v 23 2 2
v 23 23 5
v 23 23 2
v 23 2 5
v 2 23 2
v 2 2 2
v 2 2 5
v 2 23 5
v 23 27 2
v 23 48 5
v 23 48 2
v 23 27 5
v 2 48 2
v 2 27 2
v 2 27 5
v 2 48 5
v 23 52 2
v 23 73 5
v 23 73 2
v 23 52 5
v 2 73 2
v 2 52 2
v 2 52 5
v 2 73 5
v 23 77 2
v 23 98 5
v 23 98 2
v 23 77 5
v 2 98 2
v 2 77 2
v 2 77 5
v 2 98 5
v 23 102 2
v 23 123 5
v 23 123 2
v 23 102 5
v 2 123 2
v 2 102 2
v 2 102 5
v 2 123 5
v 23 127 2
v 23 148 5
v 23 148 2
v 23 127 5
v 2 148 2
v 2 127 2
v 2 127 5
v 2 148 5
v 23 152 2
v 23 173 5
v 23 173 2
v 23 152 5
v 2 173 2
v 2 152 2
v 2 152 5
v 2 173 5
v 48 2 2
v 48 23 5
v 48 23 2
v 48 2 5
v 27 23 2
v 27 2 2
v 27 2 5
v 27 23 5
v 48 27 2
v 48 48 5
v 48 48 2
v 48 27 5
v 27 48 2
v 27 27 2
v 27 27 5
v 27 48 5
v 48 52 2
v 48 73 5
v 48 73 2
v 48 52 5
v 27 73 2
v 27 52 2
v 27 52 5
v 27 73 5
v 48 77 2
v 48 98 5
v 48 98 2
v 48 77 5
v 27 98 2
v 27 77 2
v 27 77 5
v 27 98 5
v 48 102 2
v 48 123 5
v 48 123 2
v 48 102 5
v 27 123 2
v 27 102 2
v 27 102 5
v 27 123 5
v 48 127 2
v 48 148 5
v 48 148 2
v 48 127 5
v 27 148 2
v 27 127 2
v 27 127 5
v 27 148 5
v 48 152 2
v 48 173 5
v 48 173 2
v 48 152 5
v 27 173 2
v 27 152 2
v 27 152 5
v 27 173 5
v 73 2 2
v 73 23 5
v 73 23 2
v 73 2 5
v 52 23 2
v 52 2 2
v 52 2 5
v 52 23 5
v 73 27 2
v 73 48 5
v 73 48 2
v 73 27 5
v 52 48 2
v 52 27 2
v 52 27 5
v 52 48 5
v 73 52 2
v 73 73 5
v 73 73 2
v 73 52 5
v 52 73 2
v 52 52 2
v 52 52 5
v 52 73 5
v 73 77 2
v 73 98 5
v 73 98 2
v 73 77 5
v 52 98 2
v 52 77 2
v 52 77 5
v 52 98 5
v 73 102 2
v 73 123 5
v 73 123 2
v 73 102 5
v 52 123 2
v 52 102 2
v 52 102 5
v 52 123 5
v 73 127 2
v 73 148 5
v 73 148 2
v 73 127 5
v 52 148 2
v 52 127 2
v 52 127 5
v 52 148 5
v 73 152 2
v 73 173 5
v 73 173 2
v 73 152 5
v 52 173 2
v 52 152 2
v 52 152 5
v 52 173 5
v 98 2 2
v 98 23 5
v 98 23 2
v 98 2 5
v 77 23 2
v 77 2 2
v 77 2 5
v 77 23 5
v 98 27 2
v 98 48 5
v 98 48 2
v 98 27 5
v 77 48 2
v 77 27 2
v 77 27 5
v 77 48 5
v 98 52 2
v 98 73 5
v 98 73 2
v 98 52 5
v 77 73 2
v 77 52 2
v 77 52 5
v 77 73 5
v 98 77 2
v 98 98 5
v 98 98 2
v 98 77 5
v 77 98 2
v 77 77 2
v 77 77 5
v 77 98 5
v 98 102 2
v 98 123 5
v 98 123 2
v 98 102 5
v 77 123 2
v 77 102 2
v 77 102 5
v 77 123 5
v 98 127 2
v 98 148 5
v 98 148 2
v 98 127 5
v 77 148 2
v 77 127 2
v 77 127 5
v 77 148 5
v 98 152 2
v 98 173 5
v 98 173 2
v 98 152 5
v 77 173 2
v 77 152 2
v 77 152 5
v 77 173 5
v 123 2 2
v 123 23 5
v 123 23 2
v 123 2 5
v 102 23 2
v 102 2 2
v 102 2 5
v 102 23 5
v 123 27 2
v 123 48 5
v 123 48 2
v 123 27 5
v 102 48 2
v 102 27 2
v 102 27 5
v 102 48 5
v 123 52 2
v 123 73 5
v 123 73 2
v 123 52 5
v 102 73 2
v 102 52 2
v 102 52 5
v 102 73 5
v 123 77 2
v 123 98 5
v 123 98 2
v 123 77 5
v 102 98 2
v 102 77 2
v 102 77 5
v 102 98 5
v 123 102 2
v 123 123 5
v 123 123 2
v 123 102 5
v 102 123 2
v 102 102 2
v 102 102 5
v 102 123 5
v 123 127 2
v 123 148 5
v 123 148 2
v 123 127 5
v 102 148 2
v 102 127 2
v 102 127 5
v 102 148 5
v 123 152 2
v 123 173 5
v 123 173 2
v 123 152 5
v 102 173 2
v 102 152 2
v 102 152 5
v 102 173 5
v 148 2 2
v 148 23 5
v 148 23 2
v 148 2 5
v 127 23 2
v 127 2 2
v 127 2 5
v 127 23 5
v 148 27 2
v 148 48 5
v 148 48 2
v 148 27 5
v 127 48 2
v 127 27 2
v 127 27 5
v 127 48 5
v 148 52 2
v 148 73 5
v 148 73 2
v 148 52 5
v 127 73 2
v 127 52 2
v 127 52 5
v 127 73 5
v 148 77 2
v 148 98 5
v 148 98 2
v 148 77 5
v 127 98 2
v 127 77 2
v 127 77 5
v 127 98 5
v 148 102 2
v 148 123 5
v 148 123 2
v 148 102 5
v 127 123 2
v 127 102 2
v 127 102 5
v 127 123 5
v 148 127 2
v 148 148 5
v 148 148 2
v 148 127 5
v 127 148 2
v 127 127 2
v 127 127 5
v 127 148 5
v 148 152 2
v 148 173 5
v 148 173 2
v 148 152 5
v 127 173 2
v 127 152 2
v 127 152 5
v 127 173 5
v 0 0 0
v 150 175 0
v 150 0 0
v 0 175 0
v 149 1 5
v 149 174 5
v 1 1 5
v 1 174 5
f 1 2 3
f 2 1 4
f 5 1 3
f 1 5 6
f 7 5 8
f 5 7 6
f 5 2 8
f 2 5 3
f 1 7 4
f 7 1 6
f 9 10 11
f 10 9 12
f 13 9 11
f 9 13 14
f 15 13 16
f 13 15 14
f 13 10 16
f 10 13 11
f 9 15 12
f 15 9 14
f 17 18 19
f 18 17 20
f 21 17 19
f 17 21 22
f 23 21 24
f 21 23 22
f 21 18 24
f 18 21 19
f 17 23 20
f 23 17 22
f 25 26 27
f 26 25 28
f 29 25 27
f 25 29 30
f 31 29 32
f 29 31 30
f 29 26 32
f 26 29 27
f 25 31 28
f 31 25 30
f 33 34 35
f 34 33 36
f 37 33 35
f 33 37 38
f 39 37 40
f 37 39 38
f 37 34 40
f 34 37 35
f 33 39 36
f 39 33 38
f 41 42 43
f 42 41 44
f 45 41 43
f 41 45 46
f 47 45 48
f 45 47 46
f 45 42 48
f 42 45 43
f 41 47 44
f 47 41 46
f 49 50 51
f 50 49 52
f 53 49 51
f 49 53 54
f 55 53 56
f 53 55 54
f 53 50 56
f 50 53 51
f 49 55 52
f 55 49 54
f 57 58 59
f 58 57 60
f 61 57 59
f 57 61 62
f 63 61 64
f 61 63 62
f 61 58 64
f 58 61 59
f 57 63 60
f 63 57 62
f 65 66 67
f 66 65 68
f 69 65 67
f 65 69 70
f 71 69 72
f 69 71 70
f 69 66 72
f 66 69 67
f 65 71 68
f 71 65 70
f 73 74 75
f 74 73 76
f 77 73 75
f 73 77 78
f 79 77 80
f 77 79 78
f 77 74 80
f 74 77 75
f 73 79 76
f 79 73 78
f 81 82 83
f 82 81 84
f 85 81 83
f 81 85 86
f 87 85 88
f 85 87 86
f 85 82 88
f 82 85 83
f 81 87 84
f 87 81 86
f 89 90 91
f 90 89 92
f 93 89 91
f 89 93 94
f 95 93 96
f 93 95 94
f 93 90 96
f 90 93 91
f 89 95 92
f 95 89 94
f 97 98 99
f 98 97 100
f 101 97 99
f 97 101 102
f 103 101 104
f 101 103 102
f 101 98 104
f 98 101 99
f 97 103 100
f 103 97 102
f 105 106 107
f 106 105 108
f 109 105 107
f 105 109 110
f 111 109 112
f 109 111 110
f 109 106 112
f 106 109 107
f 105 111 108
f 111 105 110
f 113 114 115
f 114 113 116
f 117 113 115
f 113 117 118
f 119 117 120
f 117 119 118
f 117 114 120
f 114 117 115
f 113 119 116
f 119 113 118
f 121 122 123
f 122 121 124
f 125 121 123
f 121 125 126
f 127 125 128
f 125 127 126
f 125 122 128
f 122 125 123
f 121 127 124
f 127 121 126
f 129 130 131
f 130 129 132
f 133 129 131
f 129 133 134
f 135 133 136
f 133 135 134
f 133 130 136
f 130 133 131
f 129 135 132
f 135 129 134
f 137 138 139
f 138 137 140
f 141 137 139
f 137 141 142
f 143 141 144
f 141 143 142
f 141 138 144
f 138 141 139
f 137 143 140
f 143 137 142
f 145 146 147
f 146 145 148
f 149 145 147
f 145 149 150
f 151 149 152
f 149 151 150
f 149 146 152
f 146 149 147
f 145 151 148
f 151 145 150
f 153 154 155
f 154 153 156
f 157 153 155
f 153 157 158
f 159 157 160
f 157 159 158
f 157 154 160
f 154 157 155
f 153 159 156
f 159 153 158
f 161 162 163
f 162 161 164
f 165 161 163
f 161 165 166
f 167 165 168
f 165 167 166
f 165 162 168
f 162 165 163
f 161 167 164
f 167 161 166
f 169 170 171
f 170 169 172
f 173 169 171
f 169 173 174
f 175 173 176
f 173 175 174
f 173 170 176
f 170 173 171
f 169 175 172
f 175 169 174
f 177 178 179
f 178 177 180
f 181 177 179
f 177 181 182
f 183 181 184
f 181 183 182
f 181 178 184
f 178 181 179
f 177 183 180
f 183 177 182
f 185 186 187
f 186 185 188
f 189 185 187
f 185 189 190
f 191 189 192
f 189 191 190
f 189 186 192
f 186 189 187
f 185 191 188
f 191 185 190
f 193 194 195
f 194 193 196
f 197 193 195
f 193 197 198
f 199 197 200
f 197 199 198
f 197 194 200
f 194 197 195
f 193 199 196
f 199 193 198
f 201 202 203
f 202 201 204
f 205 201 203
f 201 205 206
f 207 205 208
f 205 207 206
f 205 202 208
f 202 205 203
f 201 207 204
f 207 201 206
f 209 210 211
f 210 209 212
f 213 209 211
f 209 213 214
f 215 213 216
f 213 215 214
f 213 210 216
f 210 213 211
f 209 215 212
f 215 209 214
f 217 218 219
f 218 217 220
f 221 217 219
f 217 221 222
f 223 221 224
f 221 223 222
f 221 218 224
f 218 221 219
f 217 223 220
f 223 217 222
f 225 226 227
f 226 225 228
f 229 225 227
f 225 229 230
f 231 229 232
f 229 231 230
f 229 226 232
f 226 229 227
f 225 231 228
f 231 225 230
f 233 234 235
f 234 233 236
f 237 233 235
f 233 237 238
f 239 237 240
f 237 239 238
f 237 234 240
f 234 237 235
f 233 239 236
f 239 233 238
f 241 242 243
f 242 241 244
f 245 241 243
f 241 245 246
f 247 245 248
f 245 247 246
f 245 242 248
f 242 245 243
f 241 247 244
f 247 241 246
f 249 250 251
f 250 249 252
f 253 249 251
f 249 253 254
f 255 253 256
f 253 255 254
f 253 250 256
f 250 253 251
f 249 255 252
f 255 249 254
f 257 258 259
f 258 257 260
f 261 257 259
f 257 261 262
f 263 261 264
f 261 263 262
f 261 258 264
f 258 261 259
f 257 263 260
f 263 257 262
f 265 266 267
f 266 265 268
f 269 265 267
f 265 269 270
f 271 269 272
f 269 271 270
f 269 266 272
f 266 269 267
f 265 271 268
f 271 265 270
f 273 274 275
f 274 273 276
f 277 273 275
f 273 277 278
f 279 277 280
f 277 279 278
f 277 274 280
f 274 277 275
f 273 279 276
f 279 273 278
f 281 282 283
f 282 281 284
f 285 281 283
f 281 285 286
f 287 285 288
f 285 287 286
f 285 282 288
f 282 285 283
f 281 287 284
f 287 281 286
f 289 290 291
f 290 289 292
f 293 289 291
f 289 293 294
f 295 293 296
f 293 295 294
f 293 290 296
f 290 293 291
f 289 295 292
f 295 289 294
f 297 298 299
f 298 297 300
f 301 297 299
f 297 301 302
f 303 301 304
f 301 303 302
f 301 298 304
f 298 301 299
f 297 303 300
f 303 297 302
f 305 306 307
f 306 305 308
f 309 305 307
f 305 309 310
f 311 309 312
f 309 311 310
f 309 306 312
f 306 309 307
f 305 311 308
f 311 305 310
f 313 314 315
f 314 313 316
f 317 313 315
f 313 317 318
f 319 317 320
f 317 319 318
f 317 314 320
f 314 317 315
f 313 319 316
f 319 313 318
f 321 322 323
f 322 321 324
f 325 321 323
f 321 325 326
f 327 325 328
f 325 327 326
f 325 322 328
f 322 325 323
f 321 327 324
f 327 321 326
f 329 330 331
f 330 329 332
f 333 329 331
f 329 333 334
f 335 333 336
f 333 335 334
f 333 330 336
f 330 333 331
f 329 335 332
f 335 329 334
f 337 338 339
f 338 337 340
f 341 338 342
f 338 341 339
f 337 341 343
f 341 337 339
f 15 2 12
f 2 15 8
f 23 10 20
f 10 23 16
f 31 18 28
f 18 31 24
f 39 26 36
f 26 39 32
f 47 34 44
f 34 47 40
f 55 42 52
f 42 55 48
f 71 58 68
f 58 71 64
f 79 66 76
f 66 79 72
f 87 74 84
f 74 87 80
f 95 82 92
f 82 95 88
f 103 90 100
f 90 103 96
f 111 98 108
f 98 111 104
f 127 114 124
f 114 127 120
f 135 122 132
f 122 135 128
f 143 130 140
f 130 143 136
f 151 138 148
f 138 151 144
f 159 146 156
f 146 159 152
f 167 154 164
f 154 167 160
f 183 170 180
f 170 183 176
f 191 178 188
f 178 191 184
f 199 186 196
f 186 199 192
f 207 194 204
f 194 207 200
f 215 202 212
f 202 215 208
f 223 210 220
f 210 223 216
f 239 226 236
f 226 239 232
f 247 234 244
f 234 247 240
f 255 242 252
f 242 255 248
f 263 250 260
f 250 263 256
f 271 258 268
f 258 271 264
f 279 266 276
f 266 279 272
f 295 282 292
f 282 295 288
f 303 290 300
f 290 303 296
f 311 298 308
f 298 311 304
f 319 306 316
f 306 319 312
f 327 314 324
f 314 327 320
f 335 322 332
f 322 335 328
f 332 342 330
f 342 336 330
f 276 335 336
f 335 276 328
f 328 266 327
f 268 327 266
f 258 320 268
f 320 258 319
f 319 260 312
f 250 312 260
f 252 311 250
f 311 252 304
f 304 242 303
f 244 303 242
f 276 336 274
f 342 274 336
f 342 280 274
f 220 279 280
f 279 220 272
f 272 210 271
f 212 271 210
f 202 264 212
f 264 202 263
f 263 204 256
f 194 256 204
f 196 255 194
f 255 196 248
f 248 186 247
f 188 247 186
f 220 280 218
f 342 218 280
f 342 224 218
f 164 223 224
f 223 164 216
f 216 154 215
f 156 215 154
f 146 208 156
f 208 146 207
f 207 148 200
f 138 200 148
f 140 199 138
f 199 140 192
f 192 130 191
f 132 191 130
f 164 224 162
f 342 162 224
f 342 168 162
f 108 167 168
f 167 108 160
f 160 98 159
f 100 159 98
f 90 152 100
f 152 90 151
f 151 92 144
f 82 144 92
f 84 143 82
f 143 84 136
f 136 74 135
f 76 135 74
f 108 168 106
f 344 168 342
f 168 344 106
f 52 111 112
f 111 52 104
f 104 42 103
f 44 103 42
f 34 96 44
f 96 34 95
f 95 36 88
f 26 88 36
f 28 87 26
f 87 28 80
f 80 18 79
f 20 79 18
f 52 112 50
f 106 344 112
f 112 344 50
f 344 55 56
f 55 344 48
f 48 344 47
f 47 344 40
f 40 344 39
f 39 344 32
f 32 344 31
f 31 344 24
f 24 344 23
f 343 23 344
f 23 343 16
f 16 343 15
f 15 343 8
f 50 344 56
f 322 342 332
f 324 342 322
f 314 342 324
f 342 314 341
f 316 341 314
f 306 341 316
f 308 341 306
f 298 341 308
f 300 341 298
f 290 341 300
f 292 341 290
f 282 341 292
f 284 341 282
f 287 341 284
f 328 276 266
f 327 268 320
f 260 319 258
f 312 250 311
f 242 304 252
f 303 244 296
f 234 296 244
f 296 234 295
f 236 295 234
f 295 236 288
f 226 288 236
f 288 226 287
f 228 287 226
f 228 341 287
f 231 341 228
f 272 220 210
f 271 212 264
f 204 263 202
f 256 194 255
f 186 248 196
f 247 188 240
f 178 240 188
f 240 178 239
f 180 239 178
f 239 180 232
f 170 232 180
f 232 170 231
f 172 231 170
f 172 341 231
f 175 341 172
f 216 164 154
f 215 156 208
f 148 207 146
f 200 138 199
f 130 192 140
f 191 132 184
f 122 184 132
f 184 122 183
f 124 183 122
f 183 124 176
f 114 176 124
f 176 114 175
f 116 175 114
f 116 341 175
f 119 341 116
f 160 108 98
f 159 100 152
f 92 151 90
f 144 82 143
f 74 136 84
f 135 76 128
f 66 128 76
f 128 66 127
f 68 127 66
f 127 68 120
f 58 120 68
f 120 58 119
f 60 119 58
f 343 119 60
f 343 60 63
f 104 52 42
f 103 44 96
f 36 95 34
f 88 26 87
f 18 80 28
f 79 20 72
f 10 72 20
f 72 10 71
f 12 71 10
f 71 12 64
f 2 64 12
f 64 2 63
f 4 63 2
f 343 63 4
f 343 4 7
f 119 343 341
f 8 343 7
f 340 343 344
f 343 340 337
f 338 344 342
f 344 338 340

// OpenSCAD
// Copyright 2023 Stefano Linguerri
//
// Licensed under the Apache License, Version 2.0 (the "License");
// you may not use this file except in compliance with the License.
// You may obtain a copy of the License at
// http://www.apache.org/licenses/LICENSE-2.0
//
// Unless required by applicable law or agreed to in writing, software
// distributed under the License is distributed on an "AS IS" BASIS,
// WITHOUT WARRANTIES OR CONDITIONS OF ANY KIND, either express or implied.¢
// See the License for the specific language governing permissions and
// limitations under the License.

//Number of columns for this tray
cols = 6;
//Number of rows for this tray
rows = 7;
//heigh (thickness) of this tray
height = 5;//.1
//new base width 
new_base_width = 25;
//new base length 
new_base_length = 25;
// existing base width of adapted models
adapted_base_width = 21;//.1
// existing base length of adapted models
adapted_base_length = 21;//.1
//minimum bottom height (thickness) of the insets for the bases
height_offset = 2;
//Inset of the top of the tray: greater the value greater the slope of the tray
inset = 1;
//if base adapted are round (in this case adapted_base_width is considered as the diameter of the round base)
isRound_adapted = false;
//magnets height (if greater than 1 will generate the insets)
magnets_height = 0.0;//.1
//magnets radius
magnets_radius = 0.0;//.1
//if the tray is for lance formation, use only the number of rows to genrate the tray
is_lance_formation = false;
//Put a mark to show the new base widh/length on the adapter
markBases = false;
//Creates a standard (not an adpater) movement tray for given Type for given new_base_length x new_base_width
create_Movement_Tray_Type="0"; // [0:None, 4:Four walls, 3:Three walls]
//Wall thickness at the top of the standalone movement tray
tray_wall_thickness = 1.5;//.1
//Extra room inside the standalone tray walls so the bases slide in freely (total, split evenly on both sides)
tray_tolerance = 1.0;//.1
//Creates holes under the tray for magnets
lower_Movement_tray_magnets="0"; // [0:None, 4:Four, 5:Five, 6:Six, 7:Seven, 9:Nine]
//Tray magnets height
lower_Movement_tray_magnets_height = 2.0;//.1
//Tray magnets radius
lower_Movement_tray_magnets_radius = 3.0;//.1

/* [Output] */
//What to generate
output_mode = "3D"; // [3D:3D model, 2D:2D outline - bottom]


module tray(cols, rows, height, new_base_width, new_base_length, adapted_base_width, adapted_base_length, inset, margin_for_empty_tray) {
    
        b_total_cols = (new_base_width * cols) + margin_for_empty_tray;
        b_total_rows = (new_base_length * rows)+ margin_for_empty_tray;
        
        t_total_cols = (new_base_width * cols - inset *2) + margin_for_empty_tray;
        t_total_rows = (new_base_length * rows - inset *2) + margin_for_empty_tray;
        
         polyhedron(
            points=[
                    [0,0,0],                        //base bottom left
                    [b_total_cols,0,0],             //base bottom right
                    [b_total_cols,b_total_rows,0],  //base top right
                    [0,b_total_rows,0],             //base top left
        

                    [inset,  inset,   height],                              //surface bottom left
                    [inset + t_total_cols, inset,  height],                 //surface bottom right
                    [inset + t_total_cols, inset + t_total_rows, height],   //surface top right
                    [inset,   inset + t_total_rows,  height]                //surface top left
                ],
            faces =[
                        [0,1,2,3],
                        [4,5,1,0],
                        [5,6,2,1],
                        [6,7,3,2],
                        [7,4,0,3],
                        [7,6,5,4]
                    ]
        ); 
   
}

/* [Hidden] */
slice_eps = 0.01;

//this module will create the hole in the "empty" classic movement tray
module empty_tray_hole(cols, rows, height_offset, new_base_width,  new_base_length, adapted_base_width, adapted_base_length, inset, margin_for_empty_tray,create_Movement_Tray_Type) {
    
    t_total_cols = (new_base_width * cols) + tray_tolerance;
    t_total_rows = (new_base_length * rows) + tray_tolerance;


    translate(
                [(margin_for_empty_tray-tray_tolerance)/2, //row
               (margin_for_empty_tray-tray_tolerance)/2, //col
                height_offset]
    )

    if(toInt(create_Movement_Tray_Type) == 3){
        cube([t_total_cols,t_total_rows+margin_for_empty_tray, 30]);
    }else{
        cube([t_total_cols,t_total_rows, 30]);
    }
}

module adapted_base_holes(cols, rows, height_offset, new_base_width,  new_base_length, adapted_base_width, adapted_base_length) {
    
    gap_w = new_base_width - adapted_base_width;
    gap_l = new_base_length - adapted_base_length;

    for (c = [0:cols-1]){
        for (r = [0:rows-1]){
           translate( 
                        [gap_w/2 + (c*adapted_base_width) + (c*gap_w), //row
                        gap_l/2 + (r*adapted_base_length) + (r*gap_l), //col
                        height_offset]
            )                       
            cube([adapted_base_width,adapted_base_length, 30]);
            
        }
    }
}

module adapted_base_holes_round(cols, rows, height_offset, new_base_width, new_base_length, adapted_base_width, adapted_base_length) {
    
    for (c = [0:cols-1]){
        for (r = [0:rows-1]){
            translate( 
                        [new_base_width/2 + new_base_width * c , //row
                        new_base_length/2 + new_base_length * r, //col
                        height_offset]
            )
            //resize([adapted_base_width,adapted_base_length]) 
            cylinder(r = adapted_base_width/2, h = height);
           
        }
    }
}

module magnets_holes (cols, rows,  new_base_width, new_base_length, magnets_height, magnets_radius, height, height_offset) {
    
    for (c = [0:cols-1]){
        for (r = [0:rows-1]){
            translate(
                        [new_base_width/2 + new_base_width * c , //row
                        new_base_length/2 + new_base_length * r, //col
                        height_offset-magnets_height+0.01]
            )
            cylinder(r = magnets_radius/2, h = magnets_height+0.01,$fn=20);
           
        }
    }
}

/// BASE MARKER
module mark_new_bases (cols, rows,  new_base_width, new_base_length, magnets_height, magnets_radius, height, height_offset) {
    color ([0.9, 0.4, 0.4])
                    {
        for (c = [1:cols-1]){
            translate( 
                [new_base_width * c-inset/2 , //col
                 new_base_length * 0, //row
                 height+height/5]
            )

            rotate([-90,0,0]) {             
                linear_extrude(new_base_length*rows) {
                     polygon(points=[[0,0],[1,0],[inset/2,(height-height_offset)]], paths=[[0,1,2]]);
                }
            }           
        }
        
        
        for (r = [1:rows-1]){
            translate( 
                    [new_base_width * 0 , //col
                     new_base_length * r-inset/2, //row
                     height+height/5]
            )
            rotate([90,90,90]) { 
                linear_extrude(new_base_width*cols) {
                    polygon(points=[[0,1],[(height-height_offset),inset/2],[0,0]], paths=[[0,1,2]]);
                }
            }
        }
    }
}

module lance_formation (cols, rows,  new_base_width, new_base_length, magnets_height, magnets_radius, height, height_offset,  inset, margin_for_empty_tray) {
    
    
    for (thisRow = [0:rows-1]){    

        translate( [0,thisRow*new_base_length,0]){
            for (thisCol = [0:thisRow]){    
                translate( [(new_base_width/2)*thisRow-(new_base_width*thisCol),0,0]){
                    //color([0.4, rands(0.01, 1,1)[0],rands(0.01, 1,1)[0] ])
                    color ([0.5, 0.5, 0.5])
                    {
                        lance_sloped_slot(thisCol+1, thisRow+1 == rows, height, new_base_width, new_base_length, adapted_base_width, adapted_base_length, inset, margin_for_empty_tray);
                    }    
                }
            }
        }
    }     
}

////////////////////////////////
// LANCE FORMATION            //
////////////////////////////////
module lance_sloped_slot(cols, isLastRow, height, new_base_width, new_base_length, adapted_base_width, adapted_base_length, inset, margin_for_empty_tray) {
    
        rows = 1;
    
        b_total_cols = (new_base_width * cols) + margin_for_empty_tray;
        b_total_rows = (new_base_length * rows)+ margin_for_empty_tray;
        
        t_total_cols = (new_base_width * cols - inset *2) + margin_for_empty_tray;
        t_total_rows = (new_base_length * rows - inset *2) + margin_for_empty_tray;

    

        polyhedron(
            points=[
                    [0,0,0],                        //base bottom left
                    [b_total_cols,0,0],             //base bottom right
                    [b_total_cols,b_total_rows,0],  //base top right
                    [0,b_total_rows,0],             //base top left
        
                    [inset,  inset,   height],                              //surface bottom left
                    [inset + t_total_cols, inset,  height],                 //surface bottom right
                    [inset + t_total_cols,  
                        isLastRow ? inset + t_total_rows : inset*3 + t_total_rows, //if last row we set the slope otherwise we move the y of the point to reach the next row
                        height],   //surface top right
                    [inset, 
                        isLastRow ? inset + t_total_rows : inset*3 + t_total_rows,//if last row we set the slope otherwise we move the y of the point to reach the next row
                        height]//surface top left
                ],
            faces =[
                        [0,1,2,3],
                        [4,5,1,0],
                        [5,6,2,1],
                        [6,7,3,2],
                        [7,4,0,3],
                        [7,6,5,4]
                    ]
        ); 
   
}


module lance_formation_hole (cols, rows,  new_base_width, new_base_length, magnets_height, magnets_radius, height, height_offset) {
    
    gap_w = new_base_width - adapted_base_width;
    gap_l = new_base_length - adapted_base_length;
    
    for (thisRow = [0:rows-1]){    

        translate( [0,thisRow*new_base_length+gap_l/2,height_offset]){
            for (thisCol = [0:thisRow]){                    
                translate( [(new_base_width/2)*thisRow-(new_base_width*thisCol)+gap_w/2,0,0]){
                    color([0.7, 0.7,0.7 ]){
                        cube([adapted_base_width, adapted_base_length,height+2 ]);
                    }    
                }
            }
        }
    }     
}

//Standard movement tray
module lance_formation_tray_hole (cols, rows,  new_base_width, new_base_length, magnets_height, magnets_radius, height, height_offset, inset, margin_for_empty_tray, create_Movement_Tray_Type) {
    
    gap_w = new_base_width - adapted_base_width;
    gap_l = new_base_length - adapted_base_length;
    
    for (thisRow = [0:rows-1]){    

        translate( [0,thisRow*new_base_length+(margin_for_empty_tray-tray_tolerance)/2,height_offset]){
            for (thisCol = [0:thisRow]){
                translate( [(new_base_width/2)*thisRow-(new_base_width*thisCol)+(margin_for_empty_tray-tray_tolerance)/2,0,0]){
                    color([0.7, 0.7,0.7 ]){

                        if(toInt(create_Movement_Tray_Type) == 3){
                            cube([new_base_width+tray_tolerance, new_base_length+margin_for_empty_tray,height+2 ]);
                        }else{
                            cube([new_base_width+tray_tolerance+0.05, new_base_length+tray_tolerance+0.05,height+2 ]);
                        }
                    }    
                }
            }
        }
    }     
}

module lance_formation_magnets_hole (cols, rows,  new_base_width, new_base_length, magnets_height, magnets_radius, height, height_offset) {
    
    gap_w = new_base_width - adapted_base_width;
    gap_l = new_base_length - adapted_base_length;
    
    for (thisRow = [0:rows-1]){    

        translate( [0,(thisRow+1)*new_base_length-new_base_length/2,height_offset-magnets_height+0.01]){
            for (thisCol = [0:thisRow]){                    
                translate( [(new_base_width/2)*thisRow-(new_base_width*thisCol)+gap_w/2+new_base_width/2,0,0]){
                    color([0.7, 0.7,0.7 ]){
                        cylinder(r = magnets_radius/2, h = magnets_height+0.01,$fn=20);
                    }    
                }
            }
        }
    }     
}


module tray_model() {

    tray_type = toInt(create_Movement_Tray_Type);
    //extra space added around the grid when a movement tray type is selected,
    //widened by the inset so the sloped outer walls keep their thickness at the top
    tray_margin = tray_type == 0 ? 0 : tray_wall_thickness*2 + inset*2 + tray_tolerance;

    //Ranked movement tray
    if(!is_lance_formation){
        difference(){
                color ([0.5, 0.5, 0.5]) {
                    if(tray_type == 0){
                        tray(cols, rows, height, new_base_width, new_base_length, adapted_base_width, adapted_base_length, inset, 0);
                    }else{
                        tray(cols, rows, height, new_base_width, new_base_length, adapted_base_width, adapted_base_length, inset, tray_margin);
                    }
                }
                color ([0.7, 0.7, 0.7]) {
                    if (magnets_height > 0){
                        translate([tray_margin/2, tray_margin/2, 0])
                        magnets_holes (cols, rows,  new_base_width, new_base_length, magnets_height, magnets_radius,height, height_offset);
                    }
                    if(tray_type == 0){
                        if(!isRound_adapted){
                            adapted_base_holes(cols, rows, height_offset, new_base_width, new_base_length, adapted_base_width, adapted_base_length);
                        }else{
                            adapted_base_holes_round(cols, rows, height_offset, new_base_width, new_base_length, adapted_base_width, adapted_base_length);
                        }
                    }else{//Add here the logic for the 4th back wall
                        empty_tray_hole(cols, rows, height_offset, new_base_width,  new_base_length, adapted_base_width, adapted_base_length, inset, tray_margin,create_Movement_Tray_Type);
                    }
                }
                
                if(markBases){
                    echo("mark it");
                    mark_new_bases (cols, rows,  new_base_width, new_base_length, magnets_height, magnets_radius, height, height_offset);
                }
                
                
                if(toInt(lower_Movement_tray_magnets) > 0){
                    translate([tray_margin/2, tray_margin/2, 0])
                    tray_magnets_holes(cols,rows,new_base_width,new_base_length, lower_Movement_tray_magnets_height, lower_Movement_tray_magnets_radius ,toInt(lower_Movement_tray_magnets),false);
                }

                
            
        }
    }

    //Lance formation movment tray
    if(is_lance_formation){    
        difference(){      
            if(tray_type == 0){
                union() {
                    lance_formation (cols, rows,  new_base_width, new_base_length, magnets_height, magnets_radius, height, height_offset, inset, 0);
                }
            }else{
                union() {
                    lance_formation (cols, rows,  new_base_width, new_base_length, magnets_height, magnets_radius, height, height_offset, inset, tray_margin);
                }
            }
            
            if(tray_type == 0){
                lance_formation_hole (cols, rows,  new_base_width, new_base_length, magnets_height, magnets_radius, height, height_offset);
            }else{
                lance_formation_tray_hole(cols, rows,  new_base_width, new_base_length, magnets_height, magnets_radius, height, height_offset, inset, tray_margin, create_Movement_Tray_Type);
            }
            
            if (magnets_height > 0){
                echo ("magnets lance");
                lance_formation_magnets_hole (cols, rows,  new_base_width, new_base_length, magnets_height, magnets_radius,height, height_offset);
            }
        /*
         if(toInt(lower_Movement_tray_magnets) > 0){
                tray_magnets_holes(cols,rows,new_base_width,new_base_length, lower_Movement_tray_magnets_height, lower_Movement_tray_magnets_radius ,toInt(lower_Movement_tray_magnets),true);
        }
*/
        }
    }
}

//Movement tray lower magnets
module tray_magnets_holes (cols, rows,  new_base_width, new_base_length, magnets_height, magnets_radius, numbers, isLanceFormation) {


    if(isLanceFormation){
        echo("LAAAAANCEEE", cavalryShift(isLanceFormation, rows,new_base_width ));

    }
    //Bottom left
    translate( 
        [new_base_width/3 + new_base_width * 0 , 
        new_base_length/3 + new_base_length * 0, 
       -0.1]
    )
    cylinder(r = magnets_radius/2, h = magnets_height+0.01,$fn=20);

    //Bottom right
    translate( 
        [(new_base_width/3*2) + new_base_width * (cols-1) ,  
        new_base_length/3 + new_base_length * 0, 
       -0.1]
    )    
    cylinder(r = magnets_radius/2, h = magnets_height+0.01,$fn=20);

    //Top left
    translate( 
        [new_base_width/3 + new_base_width * 0 ,  
        (new_base_length/3*2)+ new_base_length * (rows-1),  
       -0.1]
    )
    cylinder(r = magnets_radius/2, h = magnets_height+0.01,$fn=20);
    
    //Top right
    translate( 
        [(new_base_width/3*2) + new_base_width * (cols-1)  ,  
        (new_base_length/3*2)+ new_base_length * (rows-1),  
       -0.1]
    )
    cylinder(r = magnets_radius/2, h = magnets_height+0.01,$fn=20);
    
    //middle/center
    if(numbers == 5 || numbers == 7 || numbers == 9 ){        
        translate( 
            [ new_base_width * (cols/2)  , //row
            new_base_length * (rows/2), //col
           -0.1]
        ) 
        cylinder(r = magnets_radius/2, h = magnets_height+0.01,$fn=20);
    }
    
    //middle left/right
    if(numbers == 7 || numbers == 6 || numbers == 9){        
        translate( 
            [new_base_width/3 + new_base_width * 0 , 
            new_base_length * (rows/2), 
            -0.1]
        )
        cylinder(r = magnets_radius/2, h = magnets_height+0.01,$fn=20);
        
        translate( 
            [(new_base_width/3*2) + new_base_width * (cols-1) ,  
            new_base_length * (rows/2), 
            -0.1]
        )   

        cylinder(r = magnets_radius/2, h = magnets_height+0.01,$fn=20);
    }
    
    //middle top/bottom
    if(numbers == 9){        
        translate( 
            [ new_base_width * (cols/2)  ,  
            new_base_length/3 + new_base_length * 0,  
           -0.1]
        ) 
        cylinder(r = magnets_radius/2, h = magnets_height+0.01,$fn=20);      
      
        translate( 
            [ new_base_width * (cols/2)  , 
            (new_base_length/3*2)+ new_base_length * (rows-1), 
           -0.1]
        ) 
        cylinder(r = magnets_radius/2, h = magnets_height+0.01,$fn=20);  
    }
    
}


// ---- output dispatcher ----
if (output_mode == "2D") {
    projection(cut = true) translate([0, 0, -slice_eps]) tray_model();
} else {
    tray_model();
}


function cavalryShift(isLanceFormation, cols, base_width) =
    isLanceFormation
    ? cols* base_width
    : 0;

function toInt(s, ret=0, i=0) =
    is_num(s) ? s
    : i >= len(s)
    ? ret
    : toInt(s, ret*10 + ord(s[i]) - ord("0"), i+1);
